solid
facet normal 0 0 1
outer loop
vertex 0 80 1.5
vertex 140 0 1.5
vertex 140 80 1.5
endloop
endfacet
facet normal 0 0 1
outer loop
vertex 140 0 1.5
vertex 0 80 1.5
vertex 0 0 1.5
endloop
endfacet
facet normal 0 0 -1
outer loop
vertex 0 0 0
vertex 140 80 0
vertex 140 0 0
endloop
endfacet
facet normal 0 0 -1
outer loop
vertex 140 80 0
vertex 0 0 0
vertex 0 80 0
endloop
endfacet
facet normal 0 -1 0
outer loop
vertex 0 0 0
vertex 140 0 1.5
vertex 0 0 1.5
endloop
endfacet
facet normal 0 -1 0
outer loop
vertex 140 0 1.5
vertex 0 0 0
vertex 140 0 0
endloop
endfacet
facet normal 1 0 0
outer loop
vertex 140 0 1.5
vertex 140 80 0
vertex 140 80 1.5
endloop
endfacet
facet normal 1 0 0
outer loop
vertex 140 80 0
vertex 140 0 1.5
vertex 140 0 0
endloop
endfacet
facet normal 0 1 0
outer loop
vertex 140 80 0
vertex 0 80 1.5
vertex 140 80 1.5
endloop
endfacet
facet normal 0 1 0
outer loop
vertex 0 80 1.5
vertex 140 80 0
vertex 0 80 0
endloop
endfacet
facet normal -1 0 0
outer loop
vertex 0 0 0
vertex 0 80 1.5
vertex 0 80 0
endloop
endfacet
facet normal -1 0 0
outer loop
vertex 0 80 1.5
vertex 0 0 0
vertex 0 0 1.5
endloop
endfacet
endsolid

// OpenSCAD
lh=29;
T = 11.83;
o = 13.77;
r = 11.73;
b = 10.09;
j =  6.73;
oe= 14.94;
n = 14.29;
L=11.09;
u=14.45;
d=10.76;
v=11.15;
i= 8.31;
g=11.77;
s=10.0-0.5;
e=11.72;
n=14.29;
M=23.73;
a=13.83;
G=17.36;
f= 6.88;
t=10.50;
oes=13.77;
m=20.54;
I=9.33;
k=9.11;
l=5.58;
c=12.40;

module letter(string, trx=0, height = 3){
  translate([trx,0,0]) 
    linear_extrude(height=height, convexity=10, slices=2) import(string);
}

module tbear(){
  letter("font/T.dxf",0);
  letter("font/o.dxf",T);
  letter("font/r.dxf",T+o);
  letter("font/b.dxf",T+o+r);
  letter("font/j.dxf",T+o+r+b);
  letter("font/oslash.dxf",T+o+r+b+j);
  letter("font/r.dxf",T+o+r+b+j+oe);
  letter("font/n.dxf",T+o+r+b+j+oe+r);
}

module Ludvigsen(){
  letter("font/L.dxf",0);
  letter("font/u.dxf",L);
  letter("font/d.dxf",L+u);
  letter("font/v.dxf",L+u+d);
  letter("font/i.dxf",L+u+d+v);
  letter("font/g.dxf",L+u+d+v+i);
  letter("font/s.dxf",L+u+d+v+i+g);
  letter("font/e.dxf",L+u+d+v+i+g+s+0.5);
  letter("font/n.dxf",L+u+d+v+i+g+s+e+0.5);
}

module Maja(){
  letter("font/M.dxf",0);
  letter("font/a.dxf",M);
  letter("font/j.dxf",M+a);
  letter("font/a.dxf",M+a+j);
}

module Grafstr(){
  letter("font/G.dxf",0);
  letter("font/r.dxf",G);
  letter("font/a.dxf",G+r);
  letter("font/f.dxf",G+r+a);
  letter("font/s.dxf",G+r+a+f);
  letter("font/t.dxf",G+r+a+f+s);
  letter("font/r.dxf",G+r+a+f+s+t);
  letter("font/odieresis.dxf",G+r+a+f+s+t+r);
  letter("font/m.dxf",G+r+a+f+s+t+r+oes);
}

module Ingen(){
  letter("font/I.dxf",0);
  letter("font/n.dxf",I);
  letter("font/g.dxf",I+n);
  letter("font/e.dxf",I+n+g);
  letter("font/n.dxf",I+n+g+e);
}

module reklam(){
  letter("font/r.dxf",0);
  letter("font/e.dxf",r);
  letter("font/k.dxf",r+e);
  letter("font/l.dxf",r+e+k);
  letter("font/a.dxf",r+e+k+l);
  letter("font/m.dxf",r+e+k+l+a);
}

module Inga(){
  letter("font/I.dxf",0);
  letter("font/n.dxf",I);
  letter("font/g.dxf",I+n);
  letter("font/a.dxf",I+n+g);
}

module gratistidningar(){
  letter("font/g.dxf",0);
  letter("font/r.dxf",g);
  letter("font/a.dxf",g+r);
  letter("font/t.dxf",g+r+a);
  letter("font/i.dxf",g+r+a+t);
  letter("font/s.dxf",g+r+a+t+i);
  letter("font/t.dxf",g+r+a+t+i+s);
  letter("font/i.dxf",g+r+a+t+i+s+t);
  letter("font/d.dxf",g+r+a+t+i+s+t+i);
  letter("font/n.dxf",g+r+a+t+i+s+t+i+d);
  letter("font/i.dxf",g+r+a+t+i+s+t+i+d+n);
  letter("font/n.dxf",g+r+a+t+i+s+t+i+d+n+i);
  letter("font/g.dxf",g+r+a+t+i+s+t+i+d+n+i+n);
  letter("font/a.dxf",g+r+a+t+i+s+t+i+d+n+i+n+g);
  letter("font/r.dxf",g+r+a+t+i+s+t+i+d+n+i+n+g+a);
}

module Tack(){
  letter("font/T.dxf",0);
  letter("font/a.dxf",T);
  letter("font/c.dxf",T+a);
  letter("font/k.dxf",T+a+c);
  letter("font/exclam.dxf",T+a+c+k);
}

union(){
  color("black") cube([140,80,1.5]);
  translate([7,60,1]) scale(0.6)
  union(){
    Maja();
    //translate([64,0,0]) Grafstr();
    letter("font/G.dxf",70);
    translate([102,0,0]) Ludvigsen();
    translate([0,-lh,0]) tbear();
    translate([102,-lh,0]) Ludvigsen();
    translate([0,-2*lh,0]) Ingen();
    translate([70,-2*lh,0]) reklam();
    translate([0,-3*lh,0]) Inga();
    translate([57,-3*lh,0]) scale(0.9) gratistidningar();
    //translate([0,-4*lh,0]) Tack();
  }
}
